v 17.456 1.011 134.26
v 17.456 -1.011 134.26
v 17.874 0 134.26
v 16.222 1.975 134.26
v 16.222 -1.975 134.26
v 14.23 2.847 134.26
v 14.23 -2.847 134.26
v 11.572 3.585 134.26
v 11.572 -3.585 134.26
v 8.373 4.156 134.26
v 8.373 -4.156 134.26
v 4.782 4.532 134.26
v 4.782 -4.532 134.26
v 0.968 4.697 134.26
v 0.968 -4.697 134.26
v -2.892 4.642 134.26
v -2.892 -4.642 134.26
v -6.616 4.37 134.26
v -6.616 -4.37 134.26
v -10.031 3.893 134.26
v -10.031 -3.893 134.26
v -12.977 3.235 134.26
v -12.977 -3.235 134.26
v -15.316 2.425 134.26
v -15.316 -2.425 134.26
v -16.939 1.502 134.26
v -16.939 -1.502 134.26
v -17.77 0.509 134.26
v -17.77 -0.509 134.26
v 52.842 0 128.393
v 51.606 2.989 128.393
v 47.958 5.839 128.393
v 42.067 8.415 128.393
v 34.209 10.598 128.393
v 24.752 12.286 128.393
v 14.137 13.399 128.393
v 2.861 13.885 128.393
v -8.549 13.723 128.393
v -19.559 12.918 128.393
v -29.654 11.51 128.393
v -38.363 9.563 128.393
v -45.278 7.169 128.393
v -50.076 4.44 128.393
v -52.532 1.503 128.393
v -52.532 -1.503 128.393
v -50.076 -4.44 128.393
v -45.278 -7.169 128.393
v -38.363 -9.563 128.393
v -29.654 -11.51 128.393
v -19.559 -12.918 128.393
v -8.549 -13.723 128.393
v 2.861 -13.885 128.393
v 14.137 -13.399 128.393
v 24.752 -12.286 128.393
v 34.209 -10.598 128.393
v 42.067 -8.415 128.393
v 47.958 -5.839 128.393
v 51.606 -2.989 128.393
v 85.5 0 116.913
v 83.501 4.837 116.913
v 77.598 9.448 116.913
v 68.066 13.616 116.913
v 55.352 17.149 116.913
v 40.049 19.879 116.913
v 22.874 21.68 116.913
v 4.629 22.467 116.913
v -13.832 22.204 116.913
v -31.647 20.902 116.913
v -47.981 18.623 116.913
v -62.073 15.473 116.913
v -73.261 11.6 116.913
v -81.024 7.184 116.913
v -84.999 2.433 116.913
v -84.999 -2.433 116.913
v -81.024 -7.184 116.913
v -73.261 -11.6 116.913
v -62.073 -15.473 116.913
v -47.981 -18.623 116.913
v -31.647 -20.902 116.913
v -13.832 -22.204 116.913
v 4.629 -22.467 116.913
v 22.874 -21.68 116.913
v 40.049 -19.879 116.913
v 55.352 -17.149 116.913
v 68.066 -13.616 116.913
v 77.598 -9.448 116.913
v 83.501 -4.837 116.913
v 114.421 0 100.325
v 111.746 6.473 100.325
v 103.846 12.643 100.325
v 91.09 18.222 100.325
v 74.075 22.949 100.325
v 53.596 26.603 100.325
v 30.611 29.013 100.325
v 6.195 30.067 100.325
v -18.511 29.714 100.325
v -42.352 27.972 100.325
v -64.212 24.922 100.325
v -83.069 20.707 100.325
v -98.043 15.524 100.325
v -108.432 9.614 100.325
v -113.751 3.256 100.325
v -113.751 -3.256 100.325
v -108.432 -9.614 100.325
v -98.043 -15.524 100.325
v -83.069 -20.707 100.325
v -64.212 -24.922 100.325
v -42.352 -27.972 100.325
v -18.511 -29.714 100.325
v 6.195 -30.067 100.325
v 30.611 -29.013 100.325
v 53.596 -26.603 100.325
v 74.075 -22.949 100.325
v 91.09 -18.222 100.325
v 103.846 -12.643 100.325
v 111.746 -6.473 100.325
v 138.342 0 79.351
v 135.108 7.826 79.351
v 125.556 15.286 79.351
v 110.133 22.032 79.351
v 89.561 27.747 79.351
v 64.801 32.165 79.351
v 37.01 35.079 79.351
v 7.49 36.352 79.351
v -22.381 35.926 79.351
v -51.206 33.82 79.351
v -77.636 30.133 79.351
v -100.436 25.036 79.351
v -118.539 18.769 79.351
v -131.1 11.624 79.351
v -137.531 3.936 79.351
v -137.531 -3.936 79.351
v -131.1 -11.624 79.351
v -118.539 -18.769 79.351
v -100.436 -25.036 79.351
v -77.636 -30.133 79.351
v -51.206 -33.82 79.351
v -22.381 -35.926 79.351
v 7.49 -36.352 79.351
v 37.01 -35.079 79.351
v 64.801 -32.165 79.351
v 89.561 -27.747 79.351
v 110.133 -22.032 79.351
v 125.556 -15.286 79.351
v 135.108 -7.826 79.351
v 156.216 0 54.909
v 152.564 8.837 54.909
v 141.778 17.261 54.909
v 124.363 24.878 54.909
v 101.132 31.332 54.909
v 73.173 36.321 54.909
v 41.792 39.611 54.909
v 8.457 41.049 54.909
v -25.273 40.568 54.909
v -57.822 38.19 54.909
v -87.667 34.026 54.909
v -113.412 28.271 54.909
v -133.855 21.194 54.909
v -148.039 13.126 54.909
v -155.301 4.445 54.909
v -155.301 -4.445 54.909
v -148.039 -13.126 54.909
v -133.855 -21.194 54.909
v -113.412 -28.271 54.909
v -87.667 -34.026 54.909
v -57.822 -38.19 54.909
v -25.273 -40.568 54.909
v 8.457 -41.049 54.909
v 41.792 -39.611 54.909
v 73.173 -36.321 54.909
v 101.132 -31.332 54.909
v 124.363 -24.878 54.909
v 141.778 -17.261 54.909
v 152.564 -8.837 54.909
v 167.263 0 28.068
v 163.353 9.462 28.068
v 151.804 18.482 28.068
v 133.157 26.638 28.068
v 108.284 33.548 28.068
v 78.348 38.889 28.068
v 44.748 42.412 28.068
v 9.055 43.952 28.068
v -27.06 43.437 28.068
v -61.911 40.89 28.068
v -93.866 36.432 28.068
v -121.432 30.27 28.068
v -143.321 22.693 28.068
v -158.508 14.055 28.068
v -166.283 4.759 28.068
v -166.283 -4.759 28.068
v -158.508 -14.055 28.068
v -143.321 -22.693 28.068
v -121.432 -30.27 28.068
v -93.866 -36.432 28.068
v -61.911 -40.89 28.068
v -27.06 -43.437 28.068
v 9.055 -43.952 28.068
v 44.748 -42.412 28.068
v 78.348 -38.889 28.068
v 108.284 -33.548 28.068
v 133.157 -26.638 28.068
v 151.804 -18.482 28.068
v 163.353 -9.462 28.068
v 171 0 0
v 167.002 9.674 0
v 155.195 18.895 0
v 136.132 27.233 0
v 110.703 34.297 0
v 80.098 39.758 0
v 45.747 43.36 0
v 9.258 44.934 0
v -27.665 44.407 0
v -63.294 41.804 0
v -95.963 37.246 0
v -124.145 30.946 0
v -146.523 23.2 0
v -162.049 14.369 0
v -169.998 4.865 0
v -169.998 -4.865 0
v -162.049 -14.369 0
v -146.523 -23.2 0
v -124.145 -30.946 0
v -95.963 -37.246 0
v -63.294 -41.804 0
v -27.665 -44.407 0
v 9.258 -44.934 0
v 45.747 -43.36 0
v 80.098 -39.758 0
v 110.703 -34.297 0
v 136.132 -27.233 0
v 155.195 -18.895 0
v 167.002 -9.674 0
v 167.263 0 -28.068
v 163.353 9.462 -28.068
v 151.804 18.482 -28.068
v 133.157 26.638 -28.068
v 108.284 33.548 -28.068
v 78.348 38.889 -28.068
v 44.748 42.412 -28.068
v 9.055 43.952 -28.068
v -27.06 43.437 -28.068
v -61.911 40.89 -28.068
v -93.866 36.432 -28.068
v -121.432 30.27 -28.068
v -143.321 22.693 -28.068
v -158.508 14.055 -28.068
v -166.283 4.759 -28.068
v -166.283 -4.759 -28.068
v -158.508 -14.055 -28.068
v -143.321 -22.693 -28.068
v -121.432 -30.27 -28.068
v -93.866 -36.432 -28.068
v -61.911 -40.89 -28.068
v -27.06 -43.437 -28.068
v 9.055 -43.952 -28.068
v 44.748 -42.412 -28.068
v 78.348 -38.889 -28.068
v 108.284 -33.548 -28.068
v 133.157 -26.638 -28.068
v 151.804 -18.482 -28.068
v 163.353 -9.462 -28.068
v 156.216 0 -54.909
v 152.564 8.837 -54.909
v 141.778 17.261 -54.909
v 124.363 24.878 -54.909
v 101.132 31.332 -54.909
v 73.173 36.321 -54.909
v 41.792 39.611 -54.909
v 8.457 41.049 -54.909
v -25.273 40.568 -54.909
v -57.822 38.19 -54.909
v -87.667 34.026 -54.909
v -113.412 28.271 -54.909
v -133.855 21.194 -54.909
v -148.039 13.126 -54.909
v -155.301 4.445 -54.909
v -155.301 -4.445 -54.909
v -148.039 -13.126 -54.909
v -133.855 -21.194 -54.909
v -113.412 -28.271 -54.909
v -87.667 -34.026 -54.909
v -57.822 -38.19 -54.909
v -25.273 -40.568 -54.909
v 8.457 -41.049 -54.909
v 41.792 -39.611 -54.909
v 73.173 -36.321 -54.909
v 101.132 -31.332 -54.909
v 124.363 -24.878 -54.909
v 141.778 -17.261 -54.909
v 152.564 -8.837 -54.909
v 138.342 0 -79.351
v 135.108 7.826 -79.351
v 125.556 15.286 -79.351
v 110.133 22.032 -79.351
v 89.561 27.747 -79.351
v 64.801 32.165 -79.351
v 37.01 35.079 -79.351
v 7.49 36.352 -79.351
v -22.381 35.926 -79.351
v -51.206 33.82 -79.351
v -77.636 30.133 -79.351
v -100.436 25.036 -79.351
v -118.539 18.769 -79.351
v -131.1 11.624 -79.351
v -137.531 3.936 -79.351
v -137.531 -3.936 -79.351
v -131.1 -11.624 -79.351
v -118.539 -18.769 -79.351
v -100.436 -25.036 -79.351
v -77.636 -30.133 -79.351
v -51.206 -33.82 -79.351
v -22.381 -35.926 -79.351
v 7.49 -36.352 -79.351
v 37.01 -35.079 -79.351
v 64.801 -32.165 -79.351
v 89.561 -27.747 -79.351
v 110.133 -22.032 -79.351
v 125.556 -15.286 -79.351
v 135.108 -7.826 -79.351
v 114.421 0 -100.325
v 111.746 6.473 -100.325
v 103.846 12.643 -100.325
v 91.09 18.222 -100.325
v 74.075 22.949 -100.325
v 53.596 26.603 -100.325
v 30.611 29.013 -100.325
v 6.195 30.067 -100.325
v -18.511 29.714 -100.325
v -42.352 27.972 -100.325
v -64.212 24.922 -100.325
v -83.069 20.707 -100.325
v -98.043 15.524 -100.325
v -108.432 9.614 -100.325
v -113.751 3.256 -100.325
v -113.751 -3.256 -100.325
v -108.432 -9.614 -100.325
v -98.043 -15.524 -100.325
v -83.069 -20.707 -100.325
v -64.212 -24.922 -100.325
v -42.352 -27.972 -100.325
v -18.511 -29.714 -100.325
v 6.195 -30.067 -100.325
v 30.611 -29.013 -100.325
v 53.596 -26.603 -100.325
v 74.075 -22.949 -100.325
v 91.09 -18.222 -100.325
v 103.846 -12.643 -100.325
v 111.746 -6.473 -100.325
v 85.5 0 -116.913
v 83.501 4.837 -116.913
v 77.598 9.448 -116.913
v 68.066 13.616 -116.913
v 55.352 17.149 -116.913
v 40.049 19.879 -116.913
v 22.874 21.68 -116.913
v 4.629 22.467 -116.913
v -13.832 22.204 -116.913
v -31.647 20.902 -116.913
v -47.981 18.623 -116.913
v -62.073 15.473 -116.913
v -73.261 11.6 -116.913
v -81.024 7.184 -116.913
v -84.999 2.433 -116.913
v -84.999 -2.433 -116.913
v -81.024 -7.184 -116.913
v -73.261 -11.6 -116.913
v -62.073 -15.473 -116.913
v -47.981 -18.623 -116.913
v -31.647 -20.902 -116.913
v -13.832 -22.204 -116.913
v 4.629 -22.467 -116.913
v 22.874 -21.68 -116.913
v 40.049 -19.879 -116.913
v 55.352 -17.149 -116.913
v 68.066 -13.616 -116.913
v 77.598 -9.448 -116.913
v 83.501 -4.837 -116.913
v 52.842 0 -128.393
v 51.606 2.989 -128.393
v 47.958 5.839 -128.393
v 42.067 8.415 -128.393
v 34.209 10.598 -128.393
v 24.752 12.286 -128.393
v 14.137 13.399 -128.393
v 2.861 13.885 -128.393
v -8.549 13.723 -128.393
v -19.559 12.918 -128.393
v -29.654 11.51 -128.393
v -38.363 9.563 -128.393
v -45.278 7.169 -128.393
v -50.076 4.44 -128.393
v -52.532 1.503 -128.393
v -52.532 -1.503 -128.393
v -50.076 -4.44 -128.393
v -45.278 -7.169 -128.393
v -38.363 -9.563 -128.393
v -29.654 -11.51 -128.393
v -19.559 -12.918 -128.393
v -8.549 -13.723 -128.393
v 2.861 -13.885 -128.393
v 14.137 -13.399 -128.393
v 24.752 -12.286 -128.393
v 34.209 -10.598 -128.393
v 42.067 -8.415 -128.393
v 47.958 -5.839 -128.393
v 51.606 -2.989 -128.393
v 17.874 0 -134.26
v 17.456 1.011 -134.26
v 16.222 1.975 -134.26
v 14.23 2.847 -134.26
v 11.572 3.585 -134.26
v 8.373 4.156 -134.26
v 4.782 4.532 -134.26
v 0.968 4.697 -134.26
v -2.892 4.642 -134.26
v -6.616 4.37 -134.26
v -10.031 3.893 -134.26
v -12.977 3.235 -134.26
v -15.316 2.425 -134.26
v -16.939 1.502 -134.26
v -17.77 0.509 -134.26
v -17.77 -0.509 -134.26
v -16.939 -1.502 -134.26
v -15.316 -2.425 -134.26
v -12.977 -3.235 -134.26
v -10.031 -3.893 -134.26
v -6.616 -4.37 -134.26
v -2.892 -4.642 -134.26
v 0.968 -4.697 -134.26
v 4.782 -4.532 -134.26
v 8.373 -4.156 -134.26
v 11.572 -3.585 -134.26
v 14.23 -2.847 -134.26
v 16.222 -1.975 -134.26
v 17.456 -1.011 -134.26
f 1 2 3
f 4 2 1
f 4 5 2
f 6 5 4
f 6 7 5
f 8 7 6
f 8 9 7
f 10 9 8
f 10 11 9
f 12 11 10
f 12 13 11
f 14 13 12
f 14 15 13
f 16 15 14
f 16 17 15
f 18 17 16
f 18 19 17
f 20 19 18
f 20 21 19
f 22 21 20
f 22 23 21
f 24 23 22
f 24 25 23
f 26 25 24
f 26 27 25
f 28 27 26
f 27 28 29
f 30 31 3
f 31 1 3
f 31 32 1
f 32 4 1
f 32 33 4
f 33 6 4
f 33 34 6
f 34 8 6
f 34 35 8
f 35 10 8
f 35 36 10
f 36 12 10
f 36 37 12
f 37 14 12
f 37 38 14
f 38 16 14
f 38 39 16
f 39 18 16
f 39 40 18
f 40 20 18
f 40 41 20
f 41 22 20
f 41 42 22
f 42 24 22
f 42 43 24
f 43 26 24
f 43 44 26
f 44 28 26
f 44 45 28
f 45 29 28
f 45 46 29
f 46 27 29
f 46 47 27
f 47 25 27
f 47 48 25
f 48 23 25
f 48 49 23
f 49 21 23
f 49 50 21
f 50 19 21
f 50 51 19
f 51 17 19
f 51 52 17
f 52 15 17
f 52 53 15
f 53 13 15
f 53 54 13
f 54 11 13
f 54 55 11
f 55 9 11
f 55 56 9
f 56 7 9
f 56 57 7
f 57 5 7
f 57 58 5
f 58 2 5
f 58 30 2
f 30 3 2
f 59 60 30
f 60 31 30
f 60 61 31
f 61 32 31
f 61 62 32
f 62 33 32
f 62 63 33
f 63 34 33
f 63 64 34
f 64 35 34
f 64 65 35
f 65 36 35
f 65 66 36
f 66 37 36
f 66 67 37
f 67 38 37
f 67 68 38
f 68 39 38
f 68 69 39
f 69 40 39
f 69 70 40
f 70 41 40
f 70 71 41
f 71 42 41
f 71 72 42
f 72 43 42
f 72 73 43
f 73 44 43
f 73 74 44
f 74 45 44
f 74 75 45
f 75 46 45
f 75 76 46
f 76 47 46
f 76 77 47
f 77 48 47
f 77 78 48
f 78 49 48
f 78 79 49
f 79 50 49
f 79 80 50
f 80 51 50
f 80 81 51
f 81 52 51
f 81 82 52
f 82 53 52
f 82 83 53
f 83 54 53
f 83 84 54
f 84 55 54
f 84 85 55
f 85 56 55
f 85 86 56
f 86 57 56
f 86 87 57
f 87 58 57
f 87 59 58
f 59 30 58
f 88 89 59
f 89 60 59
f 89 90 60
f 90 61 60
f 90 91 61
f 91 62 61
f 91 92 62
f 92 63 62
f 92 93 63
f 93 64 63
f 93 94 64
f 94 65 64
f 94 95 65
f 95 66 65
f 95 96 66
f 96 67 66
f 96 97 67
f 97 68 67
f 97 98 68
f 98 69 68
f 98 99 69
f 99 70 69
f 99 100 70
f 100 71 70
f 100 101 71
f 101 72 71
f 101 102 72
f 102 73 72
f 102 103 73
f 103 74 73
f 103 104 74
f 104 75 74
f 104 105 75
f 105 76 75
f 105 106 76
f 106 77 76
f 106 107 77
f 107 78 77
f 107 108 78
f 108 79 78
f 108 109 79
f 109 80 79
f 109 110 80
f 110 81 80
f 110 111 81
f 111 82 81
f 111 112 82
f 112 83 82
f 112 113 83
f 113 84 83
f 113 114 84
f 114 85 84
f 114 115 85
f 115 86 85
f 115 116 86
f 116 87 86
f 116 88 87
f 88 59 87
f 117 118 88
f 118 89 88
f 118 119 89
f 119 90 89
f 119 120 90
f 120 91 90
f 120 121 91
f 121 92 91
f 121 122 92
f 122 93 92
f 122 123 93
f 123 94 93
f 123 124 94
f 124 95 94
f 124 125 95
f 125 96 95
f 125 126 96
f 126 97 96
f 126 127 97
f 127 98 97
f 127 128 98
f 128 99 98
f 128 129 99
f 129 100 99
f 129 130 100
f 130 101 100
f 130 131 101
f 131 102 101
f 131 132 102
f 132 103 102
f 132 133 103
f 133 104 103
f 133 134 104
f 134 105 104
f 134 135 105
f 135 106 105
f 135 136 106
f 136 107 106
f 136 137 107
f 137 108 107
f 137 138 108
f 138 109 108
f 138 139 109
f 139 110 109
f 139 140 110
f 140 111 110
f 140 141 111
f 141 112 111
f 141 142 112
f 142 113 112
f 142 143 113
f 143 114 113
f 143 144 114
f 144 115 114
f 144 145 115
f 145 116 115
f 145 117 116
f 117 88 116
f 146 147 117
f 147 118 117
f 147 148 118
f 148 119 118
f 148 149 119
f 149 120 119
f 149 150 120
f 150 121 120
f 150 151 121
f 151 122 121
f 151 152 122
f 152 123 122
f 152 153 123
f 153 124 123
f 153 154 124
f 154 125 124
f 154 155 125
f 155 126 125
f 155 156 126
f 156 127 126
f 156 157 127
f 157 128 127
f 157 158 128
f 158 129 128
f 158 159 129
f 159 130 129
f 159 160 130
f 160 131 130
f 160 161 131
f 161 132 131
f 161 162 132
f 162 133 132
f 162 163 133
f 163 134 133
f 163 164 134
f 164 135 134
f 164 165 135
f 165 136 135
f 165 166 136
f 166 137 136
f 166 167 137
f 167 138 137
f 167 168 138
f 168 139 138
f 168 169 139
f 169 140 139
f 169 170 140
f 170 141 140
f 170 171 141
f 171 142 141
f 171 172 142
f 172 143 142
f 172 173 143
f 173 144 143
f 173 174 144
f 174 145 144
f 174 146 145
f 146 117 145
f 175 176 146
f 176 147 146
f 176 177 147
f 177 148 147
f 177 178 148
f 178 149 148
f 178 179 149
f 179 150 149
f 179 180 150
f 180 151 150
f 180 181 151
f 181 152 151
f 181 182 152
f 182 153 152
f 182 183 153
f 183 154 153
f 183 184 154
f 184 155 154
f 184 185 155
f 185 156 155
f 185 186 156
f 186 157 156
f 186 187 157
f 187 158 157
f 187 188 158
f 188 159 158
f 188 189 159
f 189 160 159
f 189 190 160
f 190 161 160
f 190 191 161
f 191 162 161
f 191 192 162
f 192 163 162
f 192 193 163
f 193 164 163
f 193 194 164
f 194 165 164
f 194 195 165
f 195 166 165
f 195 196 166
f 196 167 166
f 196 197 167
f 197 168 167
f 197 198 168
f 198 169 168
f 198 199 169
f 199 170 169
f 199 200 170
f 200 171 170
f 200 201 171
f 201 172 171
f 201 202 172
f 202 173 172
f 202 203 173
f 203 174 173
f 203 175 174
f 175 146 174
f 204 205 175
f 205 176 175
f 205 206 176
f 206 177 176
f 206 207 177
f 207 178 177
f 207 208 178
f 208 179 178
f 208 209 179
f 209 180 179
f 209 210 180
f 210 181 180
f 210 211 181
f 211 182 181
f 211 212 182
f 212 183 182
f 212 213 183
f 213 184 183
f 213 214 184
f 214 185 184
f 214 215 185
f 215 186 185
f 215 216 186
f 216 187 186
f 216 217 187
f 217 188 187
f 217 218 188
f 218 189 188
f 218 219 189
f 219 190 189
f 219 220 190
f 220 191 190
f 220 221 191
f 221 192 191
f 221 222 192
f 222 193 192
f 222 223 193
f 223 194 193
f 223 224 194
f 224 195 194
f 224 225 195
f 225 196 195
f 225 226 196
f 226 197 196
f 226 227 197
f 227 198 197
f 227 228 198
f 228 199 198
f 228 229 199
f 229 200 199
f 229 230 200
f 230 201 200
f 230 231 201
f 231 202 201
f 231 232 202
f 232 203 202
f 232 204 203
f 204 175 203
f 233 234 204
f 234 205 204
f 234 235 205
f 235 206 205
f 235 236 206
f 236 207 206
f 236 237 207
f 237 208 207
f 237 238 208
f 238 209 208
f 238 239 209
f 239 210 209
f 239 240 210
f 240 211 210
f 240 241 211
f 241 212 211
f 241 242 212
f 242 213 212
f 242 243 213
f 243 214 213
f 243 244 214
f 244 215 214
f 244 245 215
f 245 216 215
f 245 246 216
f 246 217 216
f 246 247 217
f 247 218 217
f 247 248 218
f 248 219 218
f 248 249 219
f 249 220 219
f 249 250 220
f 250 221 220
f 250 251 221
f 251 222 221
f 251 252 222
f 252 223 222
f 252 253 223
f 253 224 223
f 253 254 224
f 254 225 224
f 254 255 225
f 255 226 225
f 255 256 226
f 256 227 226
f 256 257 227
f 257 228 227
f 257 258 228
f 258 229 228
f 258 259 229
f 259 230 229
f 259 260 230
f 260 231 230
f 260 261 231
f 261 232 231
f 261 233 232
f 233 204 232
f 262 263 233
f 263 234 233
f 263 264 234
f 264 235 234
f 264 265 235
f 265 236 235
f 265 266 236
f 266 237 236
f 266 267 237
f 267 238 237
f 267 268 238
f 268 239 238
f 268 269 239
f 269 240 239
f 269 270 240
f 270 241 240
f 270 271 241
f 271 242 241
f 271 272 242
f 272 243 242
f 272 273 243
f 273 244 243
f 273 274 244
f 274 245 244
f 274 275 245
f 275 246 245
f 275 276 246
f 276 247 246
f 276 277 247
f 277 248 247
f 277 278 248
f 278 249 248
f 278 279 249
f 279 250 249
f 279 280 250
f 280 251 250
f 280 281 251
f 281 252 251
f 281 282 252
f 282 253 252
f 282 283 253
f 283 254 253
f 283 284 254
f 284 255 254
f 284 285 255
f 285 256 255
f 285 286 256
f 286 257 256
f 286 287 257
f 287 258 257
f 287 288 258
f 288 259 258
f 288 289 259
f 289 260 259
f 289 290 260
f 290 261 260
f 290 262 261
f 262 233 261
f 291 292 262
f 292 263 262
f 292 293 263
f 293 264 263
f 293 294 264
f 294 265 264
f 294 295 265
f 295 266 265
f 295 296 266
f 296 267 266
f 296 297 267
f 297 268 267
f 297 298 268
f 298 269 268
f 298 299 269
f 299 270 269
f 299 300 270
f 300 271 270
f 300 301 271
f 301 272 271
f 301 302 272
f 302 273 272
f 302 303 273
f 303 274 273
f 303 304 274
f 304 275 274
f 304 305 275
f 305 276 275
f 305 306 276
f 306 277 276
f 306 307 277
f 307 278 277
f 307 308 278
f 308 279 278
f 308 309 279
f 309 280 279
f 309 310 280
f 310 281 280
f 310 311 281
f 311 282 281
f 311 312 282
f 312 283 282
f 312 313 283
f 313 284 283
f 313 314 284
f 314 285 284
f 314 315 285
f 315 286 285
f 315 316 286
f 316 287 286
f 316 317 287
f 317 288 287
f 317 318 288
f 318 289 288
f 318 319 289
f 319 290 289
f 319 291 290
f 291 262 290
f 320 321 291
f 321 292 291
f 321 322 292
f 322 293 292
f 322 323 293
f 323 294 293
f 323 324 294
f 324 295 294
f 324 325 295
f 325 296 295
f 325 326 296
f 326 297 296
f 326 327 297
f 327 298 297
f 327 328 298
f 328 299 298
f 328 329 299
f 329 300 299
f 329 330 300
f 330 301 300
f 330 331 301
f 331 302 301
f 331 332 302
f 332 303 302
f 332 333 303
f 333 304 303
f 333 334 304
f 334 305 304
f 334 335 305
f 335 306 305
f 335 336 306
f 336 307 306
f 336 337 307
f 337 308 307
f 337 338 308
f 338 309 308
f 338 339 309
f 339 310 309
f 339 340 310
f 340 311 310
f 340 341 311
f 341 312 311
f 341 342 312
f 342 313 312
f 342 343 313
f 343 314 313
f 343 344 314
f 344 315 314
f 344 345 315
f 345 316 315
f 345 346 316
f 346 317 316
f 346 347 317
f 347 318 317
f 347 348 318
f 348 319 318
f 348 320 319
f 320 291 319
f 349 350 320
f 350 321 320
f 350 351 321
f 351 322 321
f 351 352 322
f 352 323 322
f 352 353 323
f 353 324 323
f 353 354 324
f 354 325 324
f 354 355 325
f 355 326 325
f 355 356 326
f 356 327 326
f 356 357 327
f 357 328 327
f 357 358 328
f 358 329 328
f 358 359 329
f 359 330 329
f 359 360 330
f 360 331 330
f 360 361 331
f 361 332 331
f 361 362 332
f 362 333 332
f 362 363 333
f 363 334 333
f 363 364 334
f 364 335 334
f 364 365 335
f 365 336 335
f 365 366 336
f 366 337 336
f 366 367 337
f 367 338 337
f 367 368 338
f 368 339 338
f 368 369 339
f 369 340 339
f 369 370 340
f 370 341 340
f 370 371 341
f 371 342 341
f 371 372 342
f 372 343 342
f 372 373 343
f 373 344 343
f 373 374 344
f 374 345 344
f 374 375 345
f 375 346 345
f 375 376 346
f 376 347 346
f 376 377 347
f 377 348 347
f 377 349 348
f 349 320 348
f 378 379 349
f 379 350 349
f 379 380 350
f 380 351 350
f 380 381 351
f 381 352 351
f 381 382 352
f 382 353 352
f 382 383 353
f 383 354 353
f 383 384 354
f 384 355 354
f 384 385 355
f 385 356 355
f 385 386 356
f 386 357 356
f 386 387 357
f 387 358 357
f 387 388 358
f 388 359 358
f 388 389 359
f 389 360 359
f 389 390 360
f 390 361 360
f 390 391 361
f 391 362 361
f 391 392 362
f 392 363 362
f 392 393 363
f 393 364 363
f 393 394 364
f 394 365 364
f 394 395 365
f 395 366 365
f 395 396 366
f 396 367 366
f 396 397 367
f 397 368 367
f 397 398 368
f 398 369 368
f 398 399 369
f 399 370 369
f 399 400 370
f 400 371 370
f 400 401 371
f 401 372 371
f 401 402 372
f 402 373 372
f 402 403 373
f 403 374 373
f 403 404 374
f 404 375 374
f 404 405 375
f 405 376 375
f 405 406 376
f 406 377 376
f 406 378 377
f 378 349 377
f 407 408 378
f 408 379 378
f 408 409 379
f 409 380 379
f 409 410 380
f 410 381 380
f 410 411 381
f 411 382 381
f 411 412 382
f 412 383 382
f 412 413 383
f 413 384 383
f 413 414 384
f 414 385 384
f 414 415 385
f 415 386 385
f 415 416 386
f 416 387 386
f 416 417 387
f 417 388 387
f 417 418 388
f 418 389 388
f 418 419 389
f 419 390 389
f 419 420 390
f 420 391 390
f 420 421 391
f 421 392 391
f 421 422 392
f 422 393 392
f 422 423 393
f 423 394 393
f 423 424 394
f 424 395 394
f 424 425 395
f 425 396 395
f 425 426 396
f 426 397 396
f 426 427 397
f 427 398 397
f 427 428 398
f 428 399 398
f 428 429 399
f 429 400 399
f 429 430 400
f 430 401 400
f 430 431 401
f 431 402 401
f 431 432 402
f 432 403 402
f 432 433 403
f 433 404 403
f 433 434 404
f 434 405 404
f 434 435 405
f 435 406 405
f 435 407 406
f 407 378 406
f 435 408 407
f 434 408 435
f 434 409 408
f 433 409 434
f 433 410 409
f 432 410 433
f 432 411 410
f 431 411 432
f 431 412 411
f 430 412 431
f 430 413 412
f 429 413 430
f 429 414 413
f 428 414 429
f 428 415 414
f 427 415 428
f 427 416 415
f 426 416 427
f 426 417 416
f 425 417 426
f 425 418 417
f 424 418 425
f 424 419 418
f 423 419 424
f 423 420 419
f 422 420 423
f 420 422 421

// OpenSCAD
// Generated by SolidPython 1.0.1 on 2020-07-29 00:46:53


scale(v = [19, 5, 15]) {
	sphere(r = 9);
}
/***********************************************
*********      SolidPython code:      **********
************************************************
 
# import packages: SolidPython
from solid import *
from solid.utils import *
from itertools import chain, combinations, permutations


class Resize:

    def __init__(self, scad_file):
        self.scad_file = scad_file
        #self.scad_file = import_scad(scad_file)
        # cone/cylinder param:
        self.r1 = 0
        self.r2 = 0
        self.h = 0
        # rectangular prism param:
        self.w = 0
        self.l = 0
        # ellipse param:
        self.r = 0

    # import OpenScad code (file name corresponds to shape)


    # classify shape + parameters
    def assign(self, param1, param2, param3):
        if self.scad_file == 'cone.scad':
            self.r1 = param1
            self.r2 = param2
            self.h = param3
        elif self.scad_file == 'cylinder.scad':
            self.r1 = param1
            self.r2 = param2
            self.h = param3
        elif self.scad_file == 'rectangularPrism.scad':
            self.h = param1
            self.l = param2
            self.w = param3
        else:
            self.r = param1
            self.h = param2

    # resize parameters
    def iterate(self):
        x = range(3, 20, 2)
        i = 1
        if self.scad_file == 'cone.scad':
            tempList = list(permutations(x, 2))
            for temp in tempList:
                param1 = temp[0]
                param2 = temp[1]
                filepath = 'produced_scad_files/' + 'cone' + str(param1) + '_' + str(param2) + '_' + '.scad'
                scad_render_to_file(cylinder(h=param1, r1=param2, r2=0), filepath)

        elif self.scad_file == 'cylinder.scad':
            tempList = list(permutations(x, 3))
            for temp in tempList:
                param1 = temp[0]
                param2 = temp[1]
                filepath = 'produced_scad_files/' + 'cylinder' + str(param1) + '_' + str(param2) + '_' + '.scad'
                scad_render_to_file(cylinder(h=param1, r1=param2, r2=param2), filepath)

        elif self.scad_file == 'rectangularPrism.scad':
            tempList = list(permutations(x, 3))
            for temp in tempList:
                param1 = temp[0]
                param2 = temp[1]
                param3 = temp[2]
                filepath = 'produced_scad_files/' + 'rectangularPrism' + str(param1) + '_' + str(param2) + '_' + str(
                    param3) + '.scad'
                scad_render_to_file(cube(size=(param1, param2, param3)), filepath)

        elif self.scad_file == 'ellipse.scad':
            tempList = list(permutations(x, 4))
            for temp in tempList:
                param1 = temp[0]
                param2 = temp[1]
                param3 = temp[2]
                param4 = temp[3]
                filepath = 'produced_scad_files/' + 'ellipse' + str(param1) + '_' + str(param2) + '_' + str(param3) + '_' + str(param4) + '.scad'
                scad_render_to_file(scale([param1, param2, param3])(sphere(r=param4)), filepath)

    def render_to_scadfile(self):
        scad_render_to_file(scad, 'example.scad') 
 
************************************************/
